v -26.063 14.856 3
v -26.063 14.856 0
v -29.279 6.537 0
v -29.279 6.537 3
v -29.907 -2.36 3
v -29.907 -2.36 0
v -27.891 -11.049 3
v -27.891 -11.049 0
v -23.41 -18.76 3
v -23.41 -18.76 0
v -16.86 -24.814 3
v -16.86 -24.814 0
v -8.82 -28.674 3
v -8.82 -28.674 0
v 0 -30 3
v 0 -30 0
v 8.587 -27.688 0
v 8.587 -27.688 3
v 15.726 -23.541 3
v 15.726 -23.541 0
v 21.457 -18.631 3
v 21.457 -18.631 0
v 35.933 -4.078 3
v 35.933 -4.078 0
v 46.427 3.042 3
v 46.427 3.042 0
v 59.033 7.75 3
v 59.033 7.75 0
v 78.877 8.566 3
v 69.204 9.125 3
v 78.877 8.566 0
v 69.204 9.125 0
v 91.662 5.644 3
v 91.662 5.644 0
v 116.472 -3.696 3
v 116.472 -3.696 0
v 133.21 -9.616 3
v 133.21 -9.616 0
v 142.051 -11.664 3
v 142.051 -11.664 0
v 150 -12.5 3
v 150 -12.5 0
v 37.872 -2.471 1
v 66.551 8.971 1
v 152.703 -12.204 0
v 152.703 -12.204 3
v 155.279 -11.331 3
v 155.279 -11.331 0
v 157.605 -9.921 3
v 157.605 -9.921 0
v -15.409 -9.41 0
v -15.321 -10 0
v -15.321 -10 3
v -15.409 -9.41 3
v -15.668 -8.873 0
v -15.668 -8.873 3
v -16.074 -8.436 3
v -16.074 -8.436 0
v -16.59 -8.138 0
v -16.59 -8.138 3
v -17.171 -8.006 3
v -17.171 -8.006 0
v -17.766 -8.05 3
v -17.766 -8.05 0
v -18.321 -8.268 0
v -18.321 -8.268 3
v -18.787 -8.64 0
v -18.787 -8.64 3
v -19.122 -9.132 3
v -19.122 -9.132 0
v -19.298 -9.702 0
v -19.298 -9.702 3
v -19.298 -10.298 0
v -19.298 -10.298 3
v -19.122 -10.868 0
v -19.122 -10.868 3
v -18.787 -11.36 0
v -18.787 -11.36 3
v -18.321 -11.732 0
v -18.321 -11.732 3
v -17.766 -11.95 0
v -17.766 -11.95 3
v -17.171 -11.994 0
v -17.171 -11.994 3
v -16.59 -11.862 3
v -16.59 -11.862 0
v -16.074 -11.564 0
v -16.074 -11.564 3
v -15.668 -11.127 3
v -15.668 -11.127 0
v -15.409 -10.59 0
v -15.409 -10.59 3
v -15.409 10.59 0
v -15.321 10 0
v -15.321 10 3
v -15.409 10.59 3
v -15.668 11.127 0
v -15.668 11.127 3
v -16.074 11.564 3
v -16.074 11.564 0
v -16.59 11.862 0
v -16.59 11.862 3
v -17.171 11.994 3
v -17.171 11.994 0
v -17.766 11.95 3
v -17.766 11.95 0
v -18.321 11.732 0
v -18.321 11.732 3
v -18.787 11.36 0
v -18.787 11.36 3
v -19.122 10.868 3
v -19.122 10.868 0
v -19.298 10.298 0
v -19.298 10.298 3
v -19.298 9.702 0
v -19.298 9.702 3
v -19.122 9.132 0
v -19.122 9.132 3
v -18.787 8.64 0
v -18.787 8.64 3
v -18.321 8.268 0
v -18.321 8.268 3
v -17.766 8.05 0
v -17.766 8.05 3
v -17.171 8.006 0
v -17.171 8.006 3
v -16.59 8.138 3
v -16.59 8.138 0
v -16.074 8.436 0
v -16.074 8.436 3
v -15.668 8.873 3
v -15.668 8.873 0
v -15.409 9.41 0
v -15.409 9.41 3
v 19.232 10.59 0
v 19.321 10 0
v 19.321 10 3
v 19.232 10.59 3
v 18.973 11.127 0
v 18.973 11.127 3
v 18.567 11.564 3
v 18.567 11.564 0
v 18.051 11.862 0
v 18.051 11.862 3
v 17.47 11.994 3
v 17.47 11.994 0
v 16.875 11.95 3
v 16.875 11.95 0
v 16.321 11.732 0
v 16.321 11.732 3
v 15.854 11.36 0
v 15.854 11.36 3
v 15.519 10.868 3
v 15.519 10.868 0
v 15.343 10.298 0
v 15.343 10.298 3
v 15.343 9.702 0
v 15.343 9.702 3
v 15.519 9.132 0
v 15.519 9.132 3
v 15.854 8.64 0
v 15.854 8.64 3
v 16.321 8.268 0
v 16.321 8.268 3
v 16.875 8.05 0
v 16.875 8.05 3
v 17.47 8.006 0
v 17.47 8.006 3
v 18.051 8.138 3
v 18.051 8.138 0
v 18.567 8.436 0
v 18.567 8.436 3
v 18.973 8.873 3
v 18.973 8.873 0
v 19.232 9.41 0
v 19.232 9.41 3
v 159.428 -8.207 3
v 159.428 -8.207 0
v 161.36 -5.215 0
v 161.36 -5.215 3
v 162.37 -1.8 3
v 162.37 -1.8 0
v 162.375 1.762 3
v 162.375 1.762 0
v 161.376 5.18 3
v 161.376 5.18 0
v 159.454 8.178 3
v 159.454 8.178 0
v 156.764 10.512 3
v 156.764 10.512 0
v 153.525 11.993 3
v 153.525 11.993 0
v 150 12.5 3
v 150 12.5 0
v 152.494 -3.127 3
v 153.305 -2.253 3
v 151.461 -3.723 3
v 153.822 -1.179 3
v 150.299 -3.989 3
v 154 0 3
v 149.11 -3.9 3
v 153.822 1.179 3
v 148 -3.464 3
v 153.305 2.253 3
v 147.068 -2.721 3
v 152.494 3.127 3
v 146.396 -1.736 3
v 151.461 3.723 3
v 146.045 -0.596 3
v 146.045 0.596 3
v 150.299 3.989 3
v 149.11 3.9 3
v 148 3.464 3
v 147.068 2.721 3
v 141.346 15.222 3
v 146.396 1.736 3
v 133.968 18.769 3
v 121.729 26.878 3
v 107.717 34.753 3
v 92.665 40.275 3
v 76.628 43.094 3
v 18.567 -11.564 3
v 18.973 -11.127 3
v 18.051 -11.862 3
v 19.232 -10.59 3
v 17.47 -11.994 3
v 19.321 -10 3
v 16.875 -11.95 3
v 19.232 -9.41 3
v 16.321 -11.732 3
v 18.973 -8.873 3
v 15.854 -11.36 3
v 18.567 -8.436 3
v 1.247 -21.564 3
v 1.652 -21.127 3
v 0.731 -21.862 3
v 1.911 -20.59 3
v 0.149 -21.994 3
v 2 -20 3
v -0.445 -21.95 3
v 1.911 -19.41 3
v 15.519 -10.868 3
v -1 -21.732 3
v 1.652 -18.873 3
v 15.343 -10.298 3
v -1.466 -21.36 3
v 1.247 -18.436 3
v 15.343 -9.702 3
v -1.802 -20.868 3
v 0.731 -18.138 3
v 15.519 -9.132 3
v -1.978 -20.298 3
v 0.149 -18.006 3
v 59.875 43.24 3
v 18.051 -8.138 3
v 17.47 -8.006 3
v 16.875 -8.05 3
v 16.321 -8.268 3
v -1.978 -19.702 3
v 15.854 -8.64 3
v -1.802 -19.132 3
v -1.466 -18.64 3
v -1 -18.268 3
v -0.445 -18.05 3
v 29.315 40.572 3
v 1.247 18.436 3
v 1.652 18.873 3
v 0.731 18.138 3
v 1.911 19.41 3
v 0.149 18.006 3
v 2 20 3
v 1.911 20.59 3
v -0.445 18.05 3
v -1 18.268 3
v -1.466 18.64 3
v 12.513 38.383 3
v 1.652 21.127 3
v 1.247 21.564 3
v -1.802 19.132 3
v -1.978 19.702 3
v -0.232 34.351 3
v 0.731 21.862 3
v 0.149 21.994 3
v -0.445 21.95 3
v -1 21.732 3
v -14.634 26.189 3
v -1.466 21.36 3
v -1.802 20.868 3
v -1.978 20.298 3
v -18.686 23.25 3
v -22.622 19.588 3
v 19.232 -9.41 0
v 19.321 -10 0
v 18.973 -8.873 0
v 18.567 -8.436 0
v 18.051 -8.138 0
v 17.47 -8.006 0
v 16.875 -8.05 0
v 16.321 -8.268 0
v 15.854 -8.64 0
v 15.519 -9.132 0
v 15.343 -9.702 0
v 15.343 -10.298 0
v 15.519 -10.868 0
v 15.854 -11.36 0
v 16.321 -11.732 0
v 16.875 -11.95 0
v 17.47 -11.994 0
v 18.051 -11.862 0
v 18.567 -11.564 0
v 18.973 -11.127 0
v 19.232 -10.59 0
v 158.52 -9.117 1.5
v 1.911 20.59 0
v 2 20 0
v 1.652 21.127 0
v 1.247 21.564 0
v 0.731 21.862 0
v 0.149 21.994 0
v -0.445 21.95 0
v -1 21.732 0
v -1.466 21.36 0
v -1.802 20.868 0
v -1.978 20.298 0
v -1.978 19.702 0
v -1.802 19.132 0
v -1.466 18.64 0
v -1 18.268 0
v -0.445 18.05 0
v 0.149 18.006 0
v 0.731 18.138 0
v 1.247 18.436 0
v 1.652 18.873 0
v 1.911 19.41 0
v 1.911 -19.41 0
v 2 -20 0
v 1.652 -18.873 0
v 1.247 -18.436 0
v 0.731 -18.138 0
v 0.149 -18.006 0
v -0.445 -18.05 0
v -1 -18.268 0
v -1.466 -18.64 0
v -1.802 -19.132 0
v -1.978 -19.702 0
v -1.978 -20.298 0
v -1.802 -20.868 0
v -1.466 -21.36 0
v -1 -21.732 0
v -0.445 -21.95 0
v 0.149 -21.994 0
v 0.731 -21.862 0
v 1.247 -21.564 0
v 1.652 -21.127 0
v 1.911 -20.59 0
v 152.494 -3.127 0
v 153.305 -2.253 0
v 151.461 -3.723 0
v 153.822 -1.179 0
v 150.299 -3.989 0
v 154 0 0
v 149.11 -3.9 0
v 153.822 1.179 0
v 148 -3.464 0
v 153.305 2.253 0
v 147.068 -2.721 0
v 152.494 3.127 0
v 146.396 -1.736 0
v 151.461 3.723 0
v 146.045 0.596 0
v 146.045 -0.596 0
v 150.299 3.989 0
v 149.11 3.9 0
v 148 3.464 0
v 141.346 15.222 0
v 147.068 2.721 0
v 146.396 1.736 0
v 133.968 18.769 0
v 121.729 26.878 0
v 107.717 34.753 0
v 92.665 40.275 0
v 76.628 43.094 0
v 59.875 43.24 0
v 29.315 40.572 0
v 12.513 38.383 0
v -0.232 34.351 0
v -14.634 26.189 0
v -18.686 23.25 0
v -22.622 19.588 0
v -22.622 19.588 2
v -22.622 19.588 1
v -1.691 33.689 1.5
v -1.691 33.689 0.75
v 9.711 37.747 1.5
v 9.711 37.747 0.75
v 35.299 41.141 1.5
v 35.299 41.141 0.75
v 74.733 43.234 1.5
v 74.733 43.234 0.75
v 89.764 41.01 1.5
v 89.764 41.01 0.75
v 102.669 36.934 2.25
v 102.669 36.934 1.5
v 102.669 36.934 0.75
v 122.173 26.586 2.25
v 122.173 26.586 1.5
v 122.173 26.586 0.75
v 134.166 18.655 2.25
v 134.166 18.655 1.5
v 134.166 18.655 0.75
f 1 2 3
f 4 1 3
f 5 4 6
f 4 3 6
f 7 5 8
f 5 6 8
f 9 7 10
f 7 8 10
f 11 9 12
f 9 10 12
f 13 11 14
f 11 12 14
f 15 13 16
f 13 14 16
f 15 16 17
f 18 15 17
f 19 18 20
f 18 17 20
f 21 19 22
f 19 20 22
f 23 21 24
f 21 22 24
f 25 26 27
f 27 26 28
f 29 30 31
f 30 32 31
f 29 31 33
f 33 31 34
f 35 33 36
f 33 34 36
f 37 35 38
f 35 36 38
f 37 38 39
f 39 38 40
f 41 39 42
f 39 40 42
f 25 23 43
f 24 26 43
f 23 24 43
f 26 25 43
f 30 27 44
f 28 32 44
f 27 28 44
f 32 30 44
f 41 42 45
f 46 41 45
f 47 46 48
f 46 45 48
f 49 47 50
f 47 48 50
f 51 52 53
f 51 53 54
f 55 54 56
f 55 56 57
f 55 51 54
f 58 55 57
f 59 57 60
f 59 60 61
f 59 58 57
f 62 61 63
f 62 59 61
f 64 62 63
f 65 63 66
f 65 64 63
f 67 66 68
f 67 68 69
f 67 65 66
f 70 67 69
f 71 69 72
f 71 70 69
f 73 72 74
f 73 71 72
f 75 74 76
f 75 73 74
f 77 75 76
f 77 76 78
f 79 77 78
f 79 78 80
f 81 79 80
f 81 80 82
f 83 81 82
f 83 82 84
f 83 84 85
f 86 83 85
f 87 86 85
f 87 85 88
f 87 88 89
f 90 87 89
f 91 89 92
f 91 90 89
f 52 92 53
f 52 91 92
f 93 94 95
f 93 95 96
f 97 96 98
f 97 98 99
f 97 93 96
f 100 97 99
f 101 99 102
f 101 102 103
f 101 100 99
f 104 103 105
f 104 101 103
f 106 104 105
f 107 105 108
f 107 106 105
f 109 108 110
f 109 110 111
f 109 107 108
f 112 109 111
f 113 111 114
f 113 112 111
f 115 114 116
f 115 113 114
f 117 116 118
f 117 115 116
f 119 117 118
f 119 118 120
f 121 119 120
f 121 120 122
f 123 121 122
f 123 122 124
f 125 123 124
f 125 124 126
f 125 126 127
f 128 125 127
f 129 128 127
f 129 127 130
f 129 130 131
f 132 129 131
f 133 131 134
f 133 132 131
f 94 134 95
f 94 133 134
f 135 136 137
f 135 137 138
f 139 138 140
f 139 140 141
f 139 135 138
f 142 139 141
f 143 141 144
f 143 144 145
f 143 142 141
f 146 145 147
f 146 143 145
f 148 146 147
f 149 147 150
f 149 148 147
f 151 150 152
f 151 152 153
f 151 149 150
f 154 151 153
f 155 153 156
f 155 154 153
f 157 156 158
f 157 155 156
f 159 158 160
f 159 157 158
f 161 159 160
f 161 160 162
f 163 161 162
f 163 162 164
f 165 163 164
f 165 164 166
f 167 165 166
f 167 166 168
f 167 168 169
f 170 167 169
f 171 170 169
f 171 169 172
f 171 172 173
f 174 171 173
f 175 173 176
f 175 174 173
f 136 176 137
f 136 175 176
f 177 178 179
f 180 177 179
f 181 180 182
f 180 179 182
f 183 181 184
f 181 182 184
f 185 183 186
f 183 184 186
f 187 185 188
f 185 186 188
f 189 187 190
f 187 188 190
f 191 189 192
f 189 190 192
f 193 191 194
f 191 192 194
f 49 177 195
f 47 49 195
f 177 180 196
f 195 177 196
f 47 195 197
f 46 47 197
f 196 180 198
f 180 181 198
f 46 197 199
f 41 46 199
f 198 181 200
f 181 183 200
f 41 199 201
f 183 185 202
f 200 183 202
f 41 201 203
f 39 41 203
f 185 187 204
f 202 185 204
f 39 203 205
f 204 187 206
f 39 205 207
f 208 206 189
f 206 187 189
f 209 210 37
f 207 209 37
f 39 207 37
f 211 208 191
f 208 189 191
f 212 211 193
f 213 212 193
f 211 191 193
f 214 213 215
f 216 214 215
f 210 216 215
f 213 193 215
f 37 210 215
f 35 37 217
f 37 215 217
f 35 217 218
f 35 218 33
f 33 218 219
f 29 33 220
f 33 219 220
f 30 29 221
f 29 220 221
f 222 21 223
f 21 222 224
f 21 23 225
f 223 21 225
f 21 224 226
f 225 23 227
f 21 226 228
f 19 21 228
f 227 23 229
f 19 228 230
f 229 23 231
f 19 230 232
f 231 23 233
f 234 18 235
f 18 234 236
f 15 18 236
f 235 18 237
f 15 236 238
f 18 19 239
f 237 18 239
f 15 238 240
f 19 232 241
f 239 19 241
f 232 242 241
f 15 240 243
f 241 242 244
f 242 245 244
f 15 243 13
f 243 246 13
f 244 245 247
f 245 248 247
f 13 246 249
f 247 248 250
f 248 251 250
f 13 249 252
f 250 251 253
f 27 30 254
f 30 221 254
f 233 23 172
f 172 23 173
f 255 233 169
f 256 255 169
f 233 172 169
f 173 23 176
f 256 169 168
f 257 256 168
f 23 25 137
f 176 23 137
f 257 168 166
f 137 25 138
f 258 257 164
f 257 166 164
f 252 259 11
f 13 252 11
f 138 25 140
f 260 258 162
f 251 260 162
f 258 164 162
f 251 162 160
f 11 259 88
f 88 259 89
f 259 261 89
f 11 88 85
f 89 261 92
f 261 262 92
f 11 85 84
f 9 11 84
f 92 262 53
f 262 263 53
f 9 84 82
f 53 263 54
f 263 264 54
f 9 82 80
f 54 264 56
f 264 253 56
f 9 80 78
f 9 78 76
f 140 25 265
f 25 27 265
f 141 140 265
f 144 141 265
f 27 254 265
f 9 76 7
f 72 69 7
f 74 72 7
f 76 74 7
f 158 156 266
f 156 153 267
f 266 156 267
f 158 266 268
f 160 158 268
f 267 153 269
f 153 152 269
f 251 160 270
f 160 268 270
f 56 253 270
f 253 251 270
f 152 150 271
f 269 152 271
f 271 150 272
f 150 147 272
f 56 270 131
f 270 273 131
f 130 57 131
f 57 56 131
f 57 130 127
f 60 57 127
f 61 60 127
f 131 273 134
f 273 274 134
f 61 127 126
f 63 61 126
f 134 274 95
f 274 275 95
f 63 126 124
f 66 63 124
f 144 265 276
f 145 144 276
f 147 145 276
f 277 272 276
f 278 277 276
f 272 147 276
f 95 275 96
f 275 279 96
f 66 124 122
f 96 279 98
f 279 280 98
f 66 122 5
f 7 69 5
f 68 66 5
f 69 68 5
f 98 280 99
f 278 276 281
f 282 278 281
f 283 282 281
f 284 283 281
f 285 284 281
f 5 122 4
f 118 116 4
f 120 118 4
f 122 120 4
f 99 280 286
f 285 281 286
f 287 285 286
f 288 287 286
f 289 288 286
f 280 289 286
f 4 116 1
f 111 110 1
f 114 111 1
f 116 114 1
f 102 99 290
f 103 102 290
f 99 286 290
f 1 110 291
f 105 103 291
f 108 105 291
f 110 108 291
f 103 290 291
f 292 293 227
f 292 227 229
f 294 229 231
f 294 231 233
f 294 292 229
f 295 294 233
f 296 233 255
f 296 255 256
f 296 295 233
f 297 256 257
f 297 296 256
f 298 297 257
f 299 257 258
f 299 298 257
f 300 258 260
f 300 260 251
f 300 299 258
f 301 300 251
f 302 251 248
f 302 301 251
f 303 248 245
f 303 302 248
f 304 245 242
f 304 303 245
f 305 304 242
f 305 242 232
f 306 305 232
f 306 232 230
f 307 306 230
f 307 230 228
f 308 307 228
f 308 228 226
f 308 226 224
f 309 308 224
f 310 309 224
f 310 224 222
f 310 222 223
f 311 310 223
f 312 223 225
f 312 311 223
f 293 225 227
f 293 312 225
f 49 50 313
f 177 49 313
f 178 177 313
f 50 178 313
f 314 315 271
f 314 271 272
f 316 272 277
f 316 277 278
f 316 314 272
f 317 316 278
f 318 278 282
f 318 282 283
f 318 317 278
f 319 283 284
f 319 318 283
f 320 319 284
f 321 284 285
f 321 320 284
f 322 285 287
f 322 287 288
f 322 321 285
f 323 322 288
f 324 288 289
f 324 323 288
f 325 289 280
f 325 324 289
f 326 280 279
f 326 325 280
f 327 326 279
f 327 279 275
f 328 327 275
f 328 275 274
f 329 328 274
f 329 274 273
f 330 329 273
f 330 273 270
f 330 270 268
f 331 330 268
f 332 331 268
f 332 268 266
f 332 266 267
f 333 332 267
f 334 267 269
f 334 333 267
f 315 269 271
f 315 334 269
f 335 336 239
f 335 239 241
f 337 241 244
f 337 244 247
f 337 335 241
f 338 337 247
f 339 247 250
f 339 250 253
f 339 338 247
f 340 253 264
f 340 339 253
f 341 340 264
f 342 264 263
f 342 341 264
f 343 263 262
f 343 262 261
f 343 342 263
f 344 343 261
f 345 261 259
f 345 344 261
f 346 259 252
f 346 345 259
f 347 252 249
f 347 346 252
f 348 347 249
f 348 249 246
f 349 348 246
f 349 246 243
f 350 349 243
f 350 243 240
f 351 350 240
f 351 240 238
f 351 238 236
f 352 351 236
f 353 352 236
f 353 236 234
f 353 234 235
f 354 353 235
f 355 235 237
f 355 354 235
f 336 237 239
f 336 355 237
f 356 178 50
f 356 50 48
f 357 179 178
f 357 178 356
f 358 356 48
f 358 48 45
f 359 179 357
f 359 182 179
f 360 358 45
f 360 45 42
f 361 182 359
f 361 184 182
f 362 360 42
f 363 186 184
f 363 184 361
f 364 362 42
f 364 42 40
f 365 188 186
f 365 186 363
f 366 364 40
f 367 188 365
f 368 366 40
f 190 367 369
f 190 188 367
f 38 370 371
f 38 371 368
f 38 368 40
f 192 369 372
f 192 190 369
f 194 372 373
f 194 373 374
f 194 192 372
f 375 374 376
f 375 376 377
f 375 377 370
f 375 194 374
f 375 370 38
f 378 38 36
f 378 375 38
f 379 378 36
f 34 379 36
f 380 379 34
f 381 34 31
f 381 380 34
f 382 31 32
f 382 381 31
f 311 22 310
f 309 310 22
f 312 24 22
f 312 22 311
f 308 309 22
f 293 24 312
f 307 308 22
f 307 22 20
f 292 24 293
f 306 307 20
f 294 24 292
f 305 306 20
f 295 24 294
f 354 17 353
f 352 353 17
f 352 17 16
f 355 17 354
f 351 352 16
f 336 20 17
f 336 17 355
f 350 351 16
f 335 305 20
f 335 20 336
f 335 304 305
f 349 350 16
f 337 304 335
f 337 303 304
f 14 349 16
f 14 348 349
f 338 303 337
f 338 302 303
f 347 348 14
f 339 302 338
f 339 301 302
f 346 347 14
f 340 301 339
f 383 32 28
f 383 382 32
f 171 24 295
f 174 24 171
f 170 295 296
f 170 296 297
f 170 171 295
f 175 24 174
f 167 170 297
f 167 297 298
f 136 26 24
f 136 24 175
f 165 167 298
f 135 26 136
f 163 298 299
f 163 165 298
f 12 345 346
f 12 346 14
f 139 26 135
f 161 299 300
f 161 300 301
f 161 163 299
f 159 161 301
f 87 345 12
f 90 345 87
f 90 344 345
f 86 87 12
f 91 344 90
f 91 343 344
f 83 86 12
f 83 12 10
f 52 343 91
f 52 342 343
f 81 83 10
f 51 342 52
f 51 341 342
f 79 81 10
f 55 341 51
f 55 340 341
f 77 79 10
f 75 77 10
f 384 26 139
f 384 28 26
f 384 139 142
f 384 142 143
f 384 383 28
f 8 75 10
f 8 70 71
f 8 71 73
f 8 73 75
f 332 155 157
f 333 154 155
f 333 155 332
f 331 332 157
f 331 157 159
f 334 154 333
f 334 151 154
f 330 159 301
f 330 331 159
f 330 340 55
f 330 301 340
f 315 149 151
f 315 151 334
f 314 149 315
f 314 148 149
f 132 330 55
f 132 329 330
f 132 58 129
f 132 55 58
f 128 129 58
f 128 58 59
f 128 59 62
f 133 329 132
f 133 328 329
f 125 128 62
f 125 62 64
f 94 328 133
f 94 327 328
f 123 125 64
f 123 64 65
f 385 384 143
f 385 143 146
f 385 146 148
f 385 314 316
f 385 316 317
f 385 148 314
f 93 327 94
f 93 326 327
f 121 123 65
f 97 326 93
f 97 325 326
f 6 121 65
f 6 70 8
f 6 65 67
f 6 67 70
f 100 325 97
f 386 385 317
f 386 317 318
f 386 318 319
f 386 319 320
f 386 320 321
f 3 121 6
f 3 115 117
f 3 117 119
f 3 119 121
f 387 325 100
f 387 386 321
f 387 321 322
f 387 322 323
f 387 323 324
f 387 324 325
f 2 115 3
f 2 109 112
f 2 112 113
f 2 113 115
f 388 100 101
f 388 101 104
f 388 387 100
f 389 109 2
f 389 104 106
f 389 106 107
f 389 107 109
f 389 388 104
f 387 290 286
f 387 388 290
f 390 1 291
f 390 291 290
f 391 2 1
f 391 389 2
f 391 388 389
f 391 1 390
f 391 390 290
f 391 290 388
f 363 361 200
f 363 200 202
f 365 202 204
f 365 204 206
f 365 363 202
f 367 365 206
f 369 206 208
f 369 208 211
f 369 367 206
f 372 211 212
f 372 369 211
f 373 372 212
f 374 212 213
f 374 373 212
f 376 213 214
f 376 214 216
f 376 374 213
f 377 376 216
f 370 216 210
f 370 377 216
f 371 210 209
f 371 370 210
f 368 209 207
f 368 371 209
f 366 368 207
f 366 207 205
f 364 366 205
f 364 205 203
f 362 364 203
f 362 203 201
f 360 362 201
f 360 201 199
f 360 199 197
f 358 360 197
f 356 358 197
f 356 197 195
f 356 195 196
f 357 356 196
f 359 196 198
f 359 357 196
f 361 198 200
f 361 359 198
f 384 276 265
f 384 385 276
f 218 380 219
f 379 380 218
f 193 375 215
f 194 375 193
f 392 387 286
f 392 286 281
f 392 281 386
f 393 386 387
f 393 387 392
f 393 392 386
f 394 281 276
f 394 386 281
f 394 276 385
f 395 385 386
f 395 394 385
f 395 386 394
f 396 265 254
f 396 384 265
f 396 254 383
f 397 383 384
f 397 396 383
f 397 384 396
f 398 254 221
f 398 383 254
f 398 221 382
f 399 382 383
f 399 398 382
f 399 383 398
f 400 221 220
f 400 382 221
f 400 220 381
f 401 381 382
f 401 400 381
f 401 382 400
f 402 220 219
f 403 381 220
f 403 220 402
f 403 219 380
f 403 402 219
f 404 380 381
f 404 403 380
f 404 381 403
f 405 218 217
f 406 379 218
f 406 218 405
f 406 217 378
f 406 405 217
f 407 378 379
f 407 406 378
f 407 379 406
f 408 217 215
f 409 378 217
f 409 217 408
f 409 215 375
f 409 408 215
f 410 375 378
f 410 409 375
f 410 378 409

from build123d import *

# Parameters (mm, degrees)
SKETCH1_R           = 2
SKETCH1_R_2         = 4
BOSS_EXTRUDE3_DEPTH = 3


with BuildPart() as part:
    # Sketch1 → Boss-Extrude3 (new body)
    with BuildSketch(Plane.XY):
        with BuildLine():
            add(Edge.make_bspline(
                [(-26.063461661, 14.855839466), (-22.995207495, 20.238862419), (-18.617864266, 23.494747377), (-14.633714845, 26.188821849)],
                knots=[0, 0, 0, 0, 0.056043779, 0.056043779, 0.056043779, 0.056043779], degree=3))
            ThreePointArc((-26.063461661, 14.855839466), (-25.939113169, -15.071907909), (0, -30))
            add(Edge.make_bspline(
                [(0, -30), (17.93675339, -27.745895163), (30.170167076, -2.352031791), (85.215870065, 19.611994815), (122.19936238, -11.53423425), (150, -12.5)],
                knots=[0, 0, 0, 0, 0.288188908, 0.475939829, 1, 1, 1, 1], degree=3))
            ThreePointArc((150, -12.5), (154.015063849, -11.837620635), (157.604608427, -9.920681966))
            add(Edge.make_bspline(
                [(157.604608427, -9.920681966), (158.523147842, -9.170588579), (159.428456142, -8.206961361)],
                knots=[0.991193685, 0.991193685, 0.991193685, 1, 1, 1], degree=2))
            ThreePointArc((159.428456142, -8.206961361), (161.376225583, 5.179912306), (150, 12.5))
            add(Edge.make_bspline(
                [(-14.633714845, 26.188821849), (4.471910737, 39.10801054), (20.159751535, 39.107737434), (86.741615763, 46.999815307), (125.812924925, 25.830072722), (135.882657692, 16.075482759), (150, 12.5)],
                knots=[0.056043779, 0.056043779, 0.056043779, 0.056043779, 0.324796613, 0.474987684, 0.725167046, 0.945335071, 0.945335071, 0.945335071, 0.945335071], degree=3))
        make_face()
        with Locations((17.320508076, 10)):
            Circle(SKETCH1_R, mode=Mode.SUBTRACT)
        with Locations((0, 20)):
            Circle(SKETCH1_R, mode=Mode.SUBTRACT)
        with Locations((-17.320508076, 10)):
            Circle(SKETCH1_R, mode=Mode.SUBTRACT)
        with Locations((-17.320508076, -10)):
            Circle(SKETCH1_R, mode=Mode.SUBTRACT)
        with Locations((0, -20)):
            Circle(SKETCH1_R, mode=Mode.SUBTRACT)
        with Locations((17.320508076, -10)):
            Circle(SKETCH1_R, mode=Mode.SUBTRACT)
        with Locations((150, 0)):
            Circle(SKETCH1_R_2, mode=Mode.SUBTRACT)
    extrude(amount=BOSS_EXTRUDE3_DEPTH)


solid = part.part
